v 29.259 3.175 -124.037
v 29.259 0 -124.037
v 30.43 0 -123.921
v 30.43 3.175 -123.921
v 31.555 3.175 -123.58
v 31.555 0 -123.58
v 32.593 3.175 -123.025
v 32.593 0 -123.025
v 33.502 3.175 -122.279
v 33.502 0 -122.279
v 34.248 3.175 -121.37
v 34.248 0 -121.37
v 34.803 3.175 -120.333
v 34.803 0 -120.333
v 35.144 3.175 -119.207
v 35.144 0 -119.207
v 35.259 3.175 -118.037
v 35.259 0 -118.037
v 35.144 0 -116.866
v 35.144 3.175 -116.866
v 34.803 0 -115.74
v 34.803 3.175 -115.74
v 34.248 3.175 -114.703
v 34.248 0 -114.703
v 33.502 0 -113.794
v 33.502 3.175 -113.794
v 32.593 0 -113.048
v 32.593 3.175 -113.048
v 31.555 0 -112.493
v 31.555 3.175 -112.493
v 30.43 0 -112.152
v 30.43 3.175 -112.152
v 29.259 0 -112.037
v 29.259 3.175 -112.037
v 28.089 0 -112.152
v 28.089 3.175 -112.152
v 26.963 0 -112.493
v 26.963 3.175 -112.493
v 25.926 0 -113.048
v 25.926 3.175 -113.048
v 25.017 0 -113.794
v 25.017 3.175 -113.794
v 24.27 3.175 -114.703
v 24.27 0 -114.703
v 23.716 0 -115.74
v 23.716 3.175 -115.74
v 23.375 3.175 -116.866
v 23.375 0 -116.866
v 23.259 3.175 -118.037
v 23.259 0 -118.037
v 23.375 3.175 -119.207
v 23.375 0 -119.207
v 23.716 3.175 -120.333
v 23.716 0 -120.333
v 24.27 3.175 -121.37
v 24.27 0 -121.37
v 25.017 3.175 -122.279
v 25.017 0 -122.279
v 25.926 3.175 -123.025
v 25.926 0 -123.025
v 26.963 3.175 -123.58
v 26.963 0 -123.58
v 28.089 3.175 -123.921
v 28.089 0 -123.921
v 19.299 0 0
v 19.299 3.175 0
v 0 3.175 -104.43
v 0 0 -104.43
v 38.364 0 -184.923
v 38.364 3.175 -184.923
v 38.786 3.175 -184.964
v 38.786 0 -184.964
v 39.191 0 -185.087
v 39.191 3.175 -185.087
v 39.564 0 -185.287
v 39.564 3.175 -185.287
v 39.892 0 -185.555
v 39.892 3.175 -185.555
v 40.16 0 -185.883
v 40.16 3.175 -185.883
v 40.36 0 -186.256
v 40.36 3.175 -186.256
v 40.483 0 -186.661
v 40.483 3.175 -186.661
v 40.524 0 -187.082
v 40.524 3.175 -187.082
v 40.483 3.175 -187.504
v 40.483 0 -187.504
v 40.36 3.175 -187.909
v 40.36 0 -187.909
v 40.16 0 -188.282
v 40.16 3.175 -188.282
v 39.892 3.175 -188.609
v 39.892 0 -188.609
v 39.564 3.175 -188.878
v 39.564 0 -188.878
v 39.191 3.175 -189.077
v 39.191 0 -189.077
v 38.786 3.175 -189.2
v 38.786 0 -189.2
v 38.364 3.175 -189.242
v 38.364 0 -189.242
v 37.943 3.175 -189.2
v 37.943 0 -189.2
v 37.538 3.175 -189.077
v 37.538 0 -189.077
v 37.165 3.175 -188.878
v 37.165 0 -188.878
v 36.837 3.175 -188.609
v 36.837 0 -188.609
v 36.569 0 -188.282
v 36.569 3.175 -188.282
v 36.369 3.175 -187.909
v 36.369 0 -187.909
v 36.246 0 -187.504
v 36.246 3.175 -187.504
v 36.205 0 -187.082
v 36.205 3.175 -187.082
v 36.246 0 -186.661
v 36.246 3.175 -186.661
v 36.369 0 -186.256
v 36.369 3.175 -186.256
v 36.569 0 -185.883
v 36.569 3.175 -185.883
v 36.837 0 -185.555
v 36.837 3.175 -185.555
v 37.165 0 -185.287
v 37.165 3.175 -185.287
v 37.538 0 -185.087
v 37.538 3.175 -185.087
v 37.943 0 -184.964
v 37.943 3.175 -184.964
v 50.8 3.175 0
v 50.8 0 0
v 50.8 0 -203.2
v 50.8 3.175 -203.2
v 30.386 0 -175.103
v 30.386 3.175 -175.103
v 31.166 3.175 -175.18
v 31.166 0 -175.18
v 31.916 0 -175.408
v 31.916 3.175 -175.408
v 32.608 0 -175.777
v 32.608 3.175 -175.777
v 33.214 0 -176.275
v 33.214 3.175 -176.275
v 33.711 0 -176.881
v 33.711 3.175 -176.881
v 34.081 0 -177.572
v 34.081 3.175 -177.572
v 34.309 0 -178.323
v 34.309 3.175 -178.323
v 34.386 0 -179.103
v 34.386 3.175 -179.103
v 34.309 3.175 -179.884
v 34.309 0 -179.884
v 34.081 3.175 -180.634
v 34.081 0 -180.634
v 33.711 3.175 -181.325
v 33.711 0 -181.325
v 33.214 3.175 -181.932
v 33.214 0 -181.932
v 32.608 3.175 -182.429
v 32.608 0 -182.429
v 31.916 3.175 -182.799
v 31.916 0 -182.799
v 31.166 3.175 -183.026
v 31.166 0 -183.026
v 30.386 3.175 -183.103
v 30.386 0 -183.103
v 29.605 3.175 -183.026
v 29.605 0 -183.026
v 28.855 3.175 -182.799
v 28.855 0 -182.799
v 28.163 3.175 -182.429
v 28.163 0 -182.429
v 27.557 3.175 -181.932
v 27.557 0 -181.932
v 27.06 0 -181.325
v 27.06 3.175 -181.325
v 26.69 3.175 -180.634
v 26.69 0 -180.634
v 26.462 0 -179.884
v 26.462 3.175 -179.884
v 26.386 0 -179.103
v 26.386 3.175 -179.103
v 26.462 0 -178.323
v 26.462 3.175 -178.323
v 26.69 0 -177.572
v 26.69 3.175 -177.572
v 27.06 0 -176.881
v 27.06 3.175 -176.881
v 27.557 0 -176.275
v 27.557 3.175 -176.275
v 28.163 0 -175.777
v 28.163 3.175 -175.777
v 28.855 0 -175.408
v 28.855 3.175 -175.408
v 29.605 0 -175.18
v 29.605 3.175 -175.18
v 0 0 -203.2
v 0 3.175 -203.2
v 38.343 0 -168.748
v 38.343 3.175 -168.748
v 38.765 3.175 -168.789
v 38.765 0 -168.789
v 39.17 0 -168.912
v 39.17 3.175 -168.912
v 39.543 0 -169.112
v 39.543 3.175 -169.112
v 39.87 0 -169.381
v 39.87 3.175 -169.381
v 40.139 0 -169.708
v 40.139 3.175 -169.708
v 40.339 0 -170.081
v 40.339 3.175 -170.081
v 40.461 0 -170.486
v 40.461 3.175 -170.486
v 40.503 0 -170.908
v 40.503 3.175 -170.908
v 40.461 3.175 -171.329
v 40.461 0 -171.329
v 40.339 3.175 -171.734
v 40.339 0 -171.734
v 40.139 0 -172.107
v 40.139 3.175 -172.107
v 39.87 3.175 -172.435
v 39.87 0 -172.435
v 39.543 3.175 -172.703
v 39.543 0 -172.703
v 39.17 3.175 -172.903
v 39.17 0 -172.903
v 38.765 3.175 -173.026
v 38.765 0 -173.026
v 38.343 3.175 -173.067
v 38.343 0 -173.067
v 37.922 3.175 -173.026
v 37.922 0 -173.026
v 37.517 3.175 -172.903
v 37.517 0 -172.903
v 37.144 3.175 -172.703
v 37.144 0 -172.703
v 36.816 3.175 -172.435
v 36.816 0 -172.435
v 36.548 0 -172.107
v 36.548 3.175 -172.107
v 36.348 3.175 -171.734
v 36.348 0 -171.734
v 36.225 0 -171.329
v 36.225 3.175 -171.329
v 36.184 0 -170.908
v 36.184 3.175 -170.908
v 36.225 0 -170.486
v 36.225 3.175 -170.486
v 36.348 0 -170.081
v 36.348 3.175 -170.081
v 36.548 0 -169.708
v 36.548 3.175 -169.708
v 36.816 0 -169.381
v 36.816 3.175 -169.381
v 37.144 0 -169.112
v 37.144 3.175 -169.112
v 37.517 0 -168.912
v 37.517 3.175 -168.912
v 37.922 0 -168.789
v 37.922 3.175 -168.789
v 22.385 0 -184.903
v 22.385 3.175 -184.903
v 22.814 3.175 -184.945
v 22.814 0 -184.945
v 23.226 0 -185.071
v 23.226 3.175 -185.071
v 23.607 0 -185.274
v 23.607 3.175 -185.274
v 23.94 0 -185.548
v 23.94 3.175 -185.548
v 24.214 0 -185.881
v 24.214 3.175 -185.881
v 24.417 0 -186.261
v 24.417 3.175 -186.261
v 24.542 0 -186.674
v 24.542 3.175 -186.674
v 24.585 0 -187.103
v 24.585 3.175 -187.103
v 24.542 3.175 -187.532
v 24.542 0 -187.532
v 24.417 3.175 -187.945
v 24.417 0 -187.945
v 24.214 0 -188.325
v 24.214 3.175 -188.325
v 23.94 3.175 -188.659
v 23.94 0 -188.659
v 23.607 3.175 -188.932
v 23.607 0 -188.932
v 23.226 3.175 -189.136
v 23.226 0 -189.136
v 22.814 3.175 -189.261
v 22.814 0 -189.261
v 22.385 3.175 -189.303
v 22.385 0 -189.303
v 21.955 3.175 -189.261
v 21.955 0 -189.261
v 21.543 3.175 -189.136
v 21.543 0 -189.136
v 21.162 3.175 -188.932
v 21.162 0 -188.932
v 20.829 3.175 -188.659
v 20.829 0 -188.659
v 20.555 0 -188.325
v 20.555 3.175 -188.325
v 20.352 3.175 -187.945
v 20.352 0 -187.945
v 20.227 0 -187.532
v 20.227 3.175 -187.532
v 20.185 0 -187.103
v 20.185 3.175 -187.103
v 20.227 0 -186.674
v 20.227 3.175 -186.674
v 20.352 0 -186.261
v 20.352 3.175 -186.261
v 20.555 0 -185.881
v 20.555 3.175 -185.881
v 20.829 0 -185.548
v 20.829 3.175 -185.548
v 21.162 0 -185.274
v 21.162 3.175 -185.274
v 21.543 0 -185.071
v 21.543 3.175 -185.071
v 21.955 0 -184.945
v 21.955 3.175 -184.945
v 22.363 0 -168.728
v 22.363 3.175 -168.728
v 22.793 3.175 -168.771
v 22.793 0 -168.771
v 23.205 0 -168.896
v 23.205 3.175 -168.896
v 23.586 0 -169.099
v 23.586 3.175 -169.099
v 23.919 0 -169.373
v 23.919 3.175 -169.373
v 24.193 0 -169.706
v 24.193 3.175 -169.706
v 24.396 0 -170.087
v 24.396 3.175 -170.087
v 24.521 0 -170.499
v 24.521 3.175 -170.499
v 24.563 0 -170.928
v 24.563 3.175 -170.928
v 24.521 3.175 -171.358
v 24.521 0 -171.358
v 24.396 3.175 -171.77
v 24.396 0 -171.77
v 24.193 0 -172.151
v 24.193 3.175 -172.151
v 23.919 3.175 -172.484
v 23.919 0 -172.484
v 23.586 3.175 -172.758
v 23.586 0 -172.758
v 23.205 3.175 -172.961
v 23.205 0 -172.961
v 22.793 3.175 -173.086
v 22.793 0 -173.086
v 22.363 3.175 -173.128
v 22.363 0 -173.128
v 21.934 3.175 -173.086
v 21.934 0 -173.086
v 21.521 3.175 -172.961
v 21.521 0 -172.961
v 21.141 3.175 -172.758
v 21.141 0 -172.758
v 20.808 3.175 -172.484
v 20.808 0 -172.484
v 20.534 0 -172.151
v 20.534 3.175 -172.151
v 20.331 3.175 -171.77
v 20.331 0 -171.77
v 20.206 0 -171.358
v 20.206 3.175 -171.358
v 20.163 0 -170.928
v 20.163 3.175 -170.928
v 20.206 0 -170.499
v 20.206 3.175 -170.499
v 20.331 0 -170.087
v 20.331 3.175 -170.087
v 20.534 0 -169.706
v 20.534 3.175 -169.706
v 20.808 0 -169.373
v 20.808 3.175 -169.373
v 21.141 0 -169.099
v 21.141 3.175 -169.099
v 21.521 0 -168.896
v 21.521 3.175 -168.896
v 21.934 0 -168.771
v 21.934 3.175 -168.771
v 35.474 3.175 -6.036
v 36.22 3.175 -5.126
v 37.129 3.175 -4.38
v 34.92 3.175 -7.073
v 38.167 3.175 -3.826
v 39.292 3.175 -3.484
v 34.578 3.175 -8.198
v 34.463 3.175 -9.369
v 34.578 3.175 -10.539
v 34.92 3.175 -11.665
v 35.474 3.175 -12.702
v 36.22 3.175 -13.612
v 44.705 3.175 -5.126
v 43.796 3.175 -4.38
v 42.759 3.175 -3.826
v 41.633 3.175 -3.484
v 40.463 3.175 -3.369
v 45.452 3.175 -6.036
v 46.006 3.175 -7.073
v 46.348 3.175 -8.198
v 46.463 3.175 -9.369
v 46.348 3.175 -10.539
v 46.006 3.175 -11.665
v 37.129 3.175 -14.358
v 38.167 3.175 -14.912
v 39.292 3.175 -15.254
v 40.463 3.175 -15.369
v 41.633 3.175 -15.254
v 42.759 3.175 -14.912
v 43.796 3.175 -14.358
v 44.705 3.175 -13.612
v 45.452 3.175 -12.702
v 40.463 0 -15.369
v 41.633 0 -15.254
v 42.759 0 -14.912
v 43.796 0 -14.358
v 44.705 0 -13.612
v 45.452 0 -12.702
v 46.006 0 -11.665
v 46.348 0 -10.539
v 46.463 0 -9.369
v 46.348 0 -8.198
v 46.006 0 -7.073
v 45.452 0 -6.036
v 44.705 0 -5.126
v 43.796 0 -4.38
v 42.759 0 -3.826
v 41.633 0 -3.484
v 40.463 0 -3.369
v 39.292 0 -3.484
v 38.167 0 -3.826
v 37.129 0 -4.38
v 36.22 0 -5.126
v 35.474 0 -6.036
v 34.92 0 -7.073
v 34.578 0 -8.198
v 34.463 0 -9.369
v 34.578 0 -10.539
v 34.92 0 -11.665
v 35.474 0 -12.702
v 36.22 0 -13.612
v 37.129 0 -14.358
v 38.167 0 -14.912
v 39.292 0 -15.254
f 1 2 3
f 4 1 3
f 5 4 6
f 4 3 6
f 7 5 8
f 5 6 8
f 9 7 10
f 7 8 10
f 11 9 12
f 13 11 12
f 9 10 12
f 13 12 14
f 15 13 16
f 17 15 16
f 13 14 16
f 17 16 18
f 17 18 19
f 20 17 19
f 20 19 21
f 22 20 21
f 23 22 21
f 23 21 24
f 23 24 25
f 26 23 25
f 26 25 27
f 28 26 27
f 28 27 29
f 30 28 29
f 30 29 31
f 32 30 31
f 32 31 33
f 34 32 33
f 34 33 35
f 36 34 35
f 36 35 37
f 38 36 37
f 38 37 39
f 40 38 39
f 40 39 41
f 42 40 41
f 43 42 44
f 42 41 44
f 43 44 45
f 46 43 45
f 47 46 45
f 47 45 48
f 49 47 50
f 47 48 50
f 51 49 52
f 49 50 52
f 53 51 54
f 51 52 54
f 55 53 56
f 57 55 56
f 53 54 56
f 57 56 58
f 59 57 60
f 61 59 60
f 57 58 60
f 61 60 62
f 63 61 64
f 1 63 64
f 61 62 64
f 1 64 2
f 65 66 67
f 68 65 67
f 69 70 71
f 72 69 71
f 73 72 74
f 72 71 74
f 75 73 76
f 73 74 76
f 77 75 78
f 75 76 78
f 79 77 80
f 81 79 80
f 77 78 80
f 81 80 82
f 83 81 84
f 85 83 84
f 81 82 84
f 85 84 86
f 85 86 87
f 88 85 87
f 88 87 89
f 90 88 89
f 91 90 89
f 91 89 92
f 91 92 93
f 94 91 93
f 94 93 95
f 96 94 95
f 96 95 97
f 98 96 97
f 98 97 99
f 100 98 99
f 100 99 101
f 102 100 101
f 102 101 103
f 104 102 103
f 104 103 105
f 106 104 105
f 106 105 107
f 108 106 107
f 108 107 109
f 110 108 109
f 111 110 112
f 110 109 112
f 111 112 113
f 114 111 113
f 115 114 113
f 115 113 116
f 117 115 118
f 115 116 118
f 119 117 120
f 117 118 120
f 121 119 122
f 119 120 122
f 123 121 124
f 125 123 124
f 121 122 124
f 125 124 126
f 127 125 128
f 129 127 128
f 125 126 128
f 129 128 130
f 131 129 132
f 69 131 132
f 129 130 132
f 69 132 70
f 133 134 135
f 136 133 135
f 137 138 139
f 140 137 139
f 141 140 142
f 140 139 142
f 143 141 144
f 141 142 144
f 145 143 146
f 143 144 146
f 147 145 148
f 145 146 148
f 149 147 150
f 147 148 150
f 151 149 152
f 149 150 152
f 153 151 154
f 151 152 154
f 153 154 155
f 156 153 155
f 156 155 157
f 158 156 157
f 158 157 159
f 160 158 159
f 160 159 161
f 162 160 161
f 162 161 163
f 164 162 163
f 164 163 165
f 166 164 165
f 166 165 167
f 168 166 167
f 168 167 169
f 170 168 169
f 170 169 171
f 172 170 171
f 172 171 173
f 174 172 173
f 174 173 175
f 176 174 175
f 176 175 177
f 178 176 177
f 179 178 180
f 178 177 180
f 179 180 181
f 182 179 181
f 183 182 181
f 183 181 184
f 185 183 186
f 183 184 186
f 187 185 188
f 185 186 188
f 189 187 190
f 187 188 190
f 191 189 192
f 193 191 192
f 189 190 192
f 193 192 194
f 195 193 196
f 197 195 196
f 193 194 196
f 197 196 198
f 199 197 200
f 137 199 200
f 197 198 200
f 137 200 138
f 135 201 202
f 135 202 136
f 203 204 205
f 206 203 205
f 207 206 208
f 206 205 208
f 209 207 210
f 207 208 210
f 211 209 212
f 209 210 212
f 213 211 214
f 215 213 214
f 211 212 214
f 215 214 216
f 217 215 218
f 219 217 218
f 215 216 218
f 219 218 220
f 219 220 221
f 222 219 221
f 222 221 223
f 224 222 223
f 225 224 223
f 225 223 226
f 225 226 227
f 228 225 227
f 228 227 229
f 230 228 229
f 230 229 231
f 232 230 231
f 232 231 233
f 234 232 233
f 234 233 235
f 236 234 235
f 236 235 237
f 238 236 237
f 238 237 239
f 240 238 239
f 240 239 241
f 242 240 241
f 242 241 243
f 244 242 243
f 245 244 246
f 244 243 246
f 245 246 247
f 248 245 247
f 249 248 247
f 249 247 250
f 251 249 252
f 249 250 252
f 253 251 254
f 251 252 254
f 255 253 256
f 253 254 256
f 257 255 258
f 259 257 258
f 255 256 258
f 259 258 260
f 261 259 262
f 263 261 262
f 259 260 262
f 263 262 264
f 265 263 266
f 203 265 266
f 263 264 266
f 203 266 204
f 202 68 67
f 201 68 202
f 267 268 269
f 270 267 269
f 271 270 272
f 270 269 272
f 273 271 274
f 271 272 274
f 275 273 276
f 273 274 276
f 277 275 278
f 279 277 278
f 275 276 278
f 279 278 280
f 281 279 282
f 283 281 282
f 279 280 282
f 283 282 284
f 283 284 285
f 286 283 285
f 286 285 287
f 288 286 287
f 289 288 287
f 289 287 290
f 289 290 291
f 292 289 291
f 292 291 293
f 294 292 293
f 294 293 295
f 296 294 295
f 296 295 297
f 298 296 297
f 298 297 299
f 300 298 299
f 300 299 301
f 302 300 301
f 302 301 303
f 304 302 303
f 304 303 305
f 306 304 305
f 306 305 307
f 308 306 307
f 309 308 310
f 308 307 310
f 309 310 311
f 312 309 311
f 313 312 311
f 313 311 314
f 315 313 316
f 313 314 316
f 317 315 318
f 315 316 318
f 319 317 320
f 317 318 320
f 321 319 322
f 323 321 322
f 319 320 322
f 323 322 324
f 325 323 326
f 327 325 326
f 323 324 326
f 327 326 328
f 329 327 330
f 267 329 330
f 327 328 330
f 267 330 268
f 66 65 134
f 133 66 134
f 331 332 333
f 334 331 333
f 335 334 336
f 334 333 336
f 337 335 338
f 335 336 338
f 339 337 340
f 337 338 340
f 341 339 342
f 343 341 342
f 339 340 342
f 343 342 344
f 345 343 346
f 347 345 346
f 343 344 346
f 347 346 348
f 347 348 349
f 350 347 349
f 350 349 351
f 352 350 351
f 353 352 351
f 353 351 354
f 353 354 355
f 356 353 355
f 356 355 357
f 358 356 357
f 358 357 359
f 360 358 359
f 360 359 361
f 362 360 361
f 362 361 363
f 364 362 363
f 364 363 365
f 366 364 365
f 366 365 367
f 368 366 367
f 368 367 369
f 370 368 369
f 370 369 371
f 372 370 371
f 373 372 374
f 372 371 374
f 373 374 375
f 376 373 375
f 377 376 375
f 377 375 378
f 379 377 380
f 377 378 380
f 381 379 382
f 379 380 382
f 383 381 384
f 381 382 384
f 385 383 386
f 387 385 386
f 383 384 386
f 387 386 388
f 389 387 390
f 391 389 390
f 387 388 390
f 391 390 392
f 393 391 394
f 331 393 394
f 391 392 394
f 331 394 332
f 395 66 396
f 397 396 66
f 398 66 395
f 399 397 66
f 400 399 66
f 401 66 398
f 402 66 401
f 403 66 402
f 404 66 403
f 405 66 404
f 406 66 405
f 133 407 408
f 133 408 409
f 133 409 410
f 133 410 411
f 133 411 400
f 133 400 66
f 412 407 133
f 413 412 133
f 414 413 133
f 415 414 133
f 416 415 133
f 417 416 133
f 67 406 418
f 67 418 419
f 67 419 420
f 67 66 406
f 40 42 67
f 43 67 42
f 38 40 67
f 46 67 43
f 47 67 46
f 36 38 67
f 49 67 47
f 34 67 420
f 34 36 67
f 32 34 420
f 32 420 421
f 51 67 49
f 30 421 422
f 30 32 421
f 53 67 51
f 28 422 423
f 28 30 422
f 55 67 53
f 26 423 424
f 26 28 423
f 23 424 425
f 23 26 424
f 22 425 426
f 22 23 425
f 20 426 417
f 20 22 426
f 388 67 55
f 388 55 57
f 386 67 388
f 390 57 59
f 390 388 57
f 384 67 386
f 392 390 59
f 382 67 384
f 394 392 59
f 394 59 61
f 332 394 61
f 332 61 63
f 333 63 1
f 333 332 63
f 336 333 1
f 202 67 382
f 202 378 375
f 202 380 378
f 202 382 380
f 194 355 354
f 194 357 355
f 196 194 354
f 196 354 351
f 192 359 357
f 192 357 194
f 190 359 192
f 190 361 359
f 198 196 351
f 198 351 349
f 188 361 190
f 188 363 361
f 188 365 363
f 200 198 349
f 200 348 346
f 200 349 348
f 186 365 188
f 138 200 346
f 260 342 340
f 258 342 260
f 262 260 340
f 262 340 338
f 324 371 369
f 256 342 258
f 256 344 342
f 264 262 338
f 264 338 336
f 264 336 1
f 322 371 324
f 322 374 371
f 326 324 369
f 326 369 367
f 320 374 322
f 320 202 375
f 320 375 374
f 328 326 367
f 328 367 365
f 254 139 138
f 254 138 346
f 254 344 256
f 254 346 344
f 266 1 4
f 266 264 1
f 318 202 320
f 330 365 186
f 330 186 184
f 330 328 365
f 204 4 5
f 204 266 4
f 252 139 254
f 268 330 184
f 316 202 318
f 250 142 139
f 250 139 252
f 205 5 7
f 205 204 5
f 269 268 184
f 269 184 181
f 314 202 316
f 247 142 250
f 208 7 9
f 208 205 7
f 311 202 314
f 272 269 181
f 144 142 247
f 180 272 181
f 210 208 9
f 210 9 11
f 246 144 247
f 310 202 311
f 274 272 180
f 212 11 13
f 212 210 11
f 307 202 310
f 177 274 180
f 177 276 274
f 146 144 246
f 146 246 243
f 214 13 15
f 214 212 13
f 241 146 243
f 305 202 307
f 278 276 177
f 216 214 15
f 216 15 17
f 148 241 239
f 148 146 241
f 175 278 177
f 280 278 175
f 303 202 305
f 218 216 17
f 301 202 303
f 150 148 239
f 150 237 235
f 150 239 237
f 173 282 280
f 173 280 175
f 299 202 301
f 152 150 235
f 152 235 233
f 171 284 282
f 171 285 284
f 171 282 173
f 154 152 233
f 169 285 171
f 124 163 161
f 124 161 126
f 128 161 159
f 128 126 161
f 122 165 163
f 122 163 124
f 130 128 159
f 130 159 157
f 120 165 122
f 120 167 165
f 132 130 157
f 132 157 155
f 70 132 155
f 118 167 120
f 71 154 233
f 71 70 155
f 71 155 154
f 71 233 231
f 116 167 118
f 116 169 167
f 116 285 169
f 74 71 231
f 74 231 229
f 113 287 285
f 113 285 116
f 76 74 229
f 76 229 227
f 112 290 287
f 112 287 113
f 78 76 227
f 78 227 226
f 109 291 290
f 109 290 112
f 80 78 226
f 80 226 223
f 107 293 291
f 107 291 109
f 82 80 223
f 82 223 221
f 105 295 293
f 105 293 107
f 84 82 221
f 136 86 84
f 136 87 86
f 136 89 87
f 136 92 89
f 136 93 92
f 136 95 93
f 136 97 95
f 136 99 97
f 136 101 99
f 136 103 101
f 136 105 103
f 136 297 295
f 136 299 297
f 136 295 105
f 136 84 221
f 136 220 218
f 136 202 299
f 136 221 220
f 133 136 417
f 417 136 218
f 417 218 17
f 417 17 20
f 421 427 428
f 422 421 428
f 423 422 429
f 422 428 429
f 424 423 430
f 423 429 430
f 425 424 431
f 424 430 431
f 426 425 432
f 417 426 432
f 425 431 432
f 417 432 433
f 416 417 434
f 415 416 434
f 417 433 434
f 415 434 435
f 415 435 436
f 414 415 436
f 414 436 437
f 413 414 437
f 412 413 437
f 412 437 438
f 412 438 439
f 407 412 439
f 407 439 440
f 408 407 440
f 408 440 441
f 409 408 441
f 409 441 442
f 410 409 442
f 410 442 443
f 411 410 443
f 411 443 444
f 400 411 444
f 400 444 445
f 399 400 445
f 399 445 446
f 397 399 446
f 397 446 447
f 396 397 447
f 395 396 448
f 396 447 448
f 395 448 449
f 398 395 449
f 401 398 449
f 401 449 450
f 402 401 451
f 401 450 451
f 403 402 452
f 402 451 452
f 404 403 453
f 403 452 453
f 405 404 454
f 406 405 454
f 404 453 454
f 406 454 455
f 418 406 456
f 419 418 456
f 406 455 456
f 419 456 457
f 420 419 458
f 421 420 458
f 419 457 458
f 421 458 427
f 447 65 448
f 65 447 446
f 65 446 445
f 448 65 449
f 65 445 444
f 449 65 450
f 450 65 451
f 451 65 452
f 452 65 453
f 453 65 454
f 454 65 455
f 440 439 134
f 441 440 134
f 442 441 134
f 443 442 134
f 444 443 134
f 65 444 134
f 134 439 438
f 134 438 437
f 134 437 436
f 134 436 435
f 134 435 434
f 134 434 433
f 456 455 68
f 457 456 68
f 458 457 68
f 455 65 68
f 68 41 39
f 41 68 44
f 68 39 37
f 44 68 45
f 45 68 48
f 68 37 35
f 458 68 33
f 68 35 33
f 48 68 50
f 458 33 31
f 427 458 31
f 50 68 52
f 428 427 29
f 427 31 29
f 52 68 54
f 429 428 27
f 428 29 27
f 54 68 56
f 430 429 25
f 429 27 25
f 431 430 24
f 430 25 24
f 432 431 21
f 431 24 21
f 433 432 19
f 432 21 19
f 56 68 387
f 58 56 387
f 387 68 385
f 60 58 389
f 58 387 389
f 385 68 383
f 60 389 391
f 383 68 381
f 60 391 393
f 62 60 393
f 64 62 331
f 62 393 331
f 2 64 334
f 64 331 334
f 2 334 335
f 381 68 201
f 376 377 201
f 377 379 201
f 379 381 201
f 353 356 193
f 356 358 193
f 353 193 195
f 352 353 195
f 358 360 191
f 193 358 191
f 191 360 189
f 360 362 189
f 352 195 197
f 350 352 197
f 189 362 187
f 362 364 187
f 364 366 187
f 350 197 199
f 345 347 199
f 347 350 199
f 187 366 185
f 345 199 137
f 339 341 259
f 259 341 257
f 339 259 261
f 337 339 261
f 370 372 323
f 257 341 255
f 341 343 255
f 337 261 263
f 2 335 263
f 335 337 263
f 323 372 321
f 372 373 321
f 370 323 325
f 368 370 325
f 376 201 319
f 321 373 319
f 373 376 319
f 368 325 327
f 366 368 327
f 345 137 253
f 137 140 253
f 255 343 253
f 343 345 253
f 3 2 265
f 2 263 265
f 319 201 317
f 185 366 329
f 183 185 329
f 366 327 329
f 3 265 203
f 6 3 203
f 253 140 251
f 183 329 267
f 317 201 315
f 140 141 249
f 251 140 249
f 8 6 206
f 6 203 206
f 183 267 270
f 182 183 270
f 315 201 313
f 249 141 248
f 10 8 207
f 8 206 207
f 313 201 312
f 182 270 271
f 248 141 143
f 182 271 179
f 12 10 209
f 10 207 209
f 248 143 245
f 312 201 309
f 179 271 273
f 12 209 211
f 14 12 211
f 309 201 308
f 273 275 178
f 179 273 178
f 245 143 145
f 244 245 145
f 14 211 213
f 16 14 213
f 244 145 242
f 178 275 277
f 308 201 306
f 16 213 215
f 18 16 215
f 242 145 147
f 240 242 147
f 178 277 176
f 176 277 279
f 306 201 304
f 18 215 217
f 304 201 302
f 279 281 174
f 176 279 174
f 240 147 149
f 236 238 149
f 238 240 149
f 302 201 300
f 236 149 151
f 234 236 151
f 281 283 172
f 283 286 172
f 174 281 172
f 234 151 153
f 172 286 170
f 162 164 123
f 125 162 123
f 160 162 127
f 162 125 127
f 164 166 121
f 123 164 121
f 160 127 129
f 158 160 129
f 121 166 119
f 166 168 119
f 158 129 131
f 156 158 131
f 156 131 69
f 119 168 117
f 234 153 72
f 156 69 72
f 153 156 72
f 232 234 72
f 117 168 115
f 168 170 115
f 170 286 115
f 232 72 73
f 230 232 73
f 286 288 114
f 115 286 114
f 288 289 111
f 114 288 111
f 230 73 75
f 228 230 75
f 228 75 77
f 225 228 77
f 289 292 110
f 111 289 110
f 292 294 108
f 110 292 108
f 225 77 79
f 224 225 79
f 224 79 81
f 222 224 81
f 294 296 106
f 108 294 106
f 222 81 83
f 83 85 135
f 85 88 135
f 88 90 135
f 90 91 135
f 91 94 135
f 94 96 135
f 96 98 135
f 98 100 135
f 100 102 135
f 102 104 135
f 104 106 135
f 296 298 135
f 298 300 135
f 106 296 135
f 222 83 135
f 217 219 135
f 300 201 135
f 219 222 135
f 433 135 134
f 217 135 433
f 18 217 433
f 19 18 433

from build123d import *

# Parameters (mm, degrees)
SKETCH1_W           = 50.8
SKETCH1_H           = 203.2
BOSS_EXTRUDE1_DEPTH = 3.175
SKETCH2_R           = 2.2
SKETCH2_R_2         = 2.159579804
SKETCH2_R_3         = 4
CUT_EXTRUDE1_DEPTH  = 10
SKETCH5_R           = 6
CUT_EXTRUDE2_DEPTH  = 10
CUT_EXTRUDE3_DEPTH  = 10


with BuildPart() as part:
    # Sketch1 → Boss-Extrude1 (new body)
    with BuildSketch(Plane(origin=(0, 0, 0), x_dir=(1, 0, 0), z_dir=(0, 1, 0))):
        with Locations((25.4, 101.6)):
            Rectangle(SKETCH1_W, SKETCH1_H)
    extrude(amount=BOSS_EXTRUDE1_DEPTH)

    # Sketch2 → Cut-Extrude1 (cut)
    with BuildSketch(Plane(origin=(0, 3.175, 0), x_dir=(1, 0, 0), z_dir=(0, 1, 0))):
        with Locations(Location((22.384513462, 187.103195302, 0), (0, 0, 270))):
            Circle(SKETCH2_R)
        with Locations(Location((38.36448905, 187.082300612, 0), (0, 0, 270))):
            Circle(SKETCH2_R_2)
        with Locations(Location((22.363364113, 170.92846049, 0), (0, 0, 270))):
            Circle(SKETCH2_R)
        with Locations(Location((38.343339701, 170.907565799, 0), (0, 0, 270))):
            Circle(SKETCH2_R_2)
        with Locations(Location((30.385513462, 179.103195302, 0), (0, 0, 270))):
            Circle(SKETCH2_R_3)
    extrude(amount=-CUT_EXTRUDE1_DEPTH, mode=Mode.SUBTRACT)

    # Sketch5 → Cut-Extrude2 (cut)
    with BuildSketch(Plane(origin=(0, 0, 0), x_dir=(-1, 0, 0), z_dir=(0, -1, 0))):
        with Locations(Location((-40.462848215, 9.36892711, 0), (0, 0, 90))):
            Circle(SKETCH5_R)
        with Locations(Location((-29.259232092, 118.036539738, 0), (0, 0, 90))):
            Circle(SKETCH5_R)
    extrude(amount=-CUT_EXTRUDE2_DEPTH, mode=Mode.SUBTRACT)

    # Sketch6 → Cut-Extrude3 (cut)
    with BuildSketch(Plane(origin=(0, 3.175, 0), x_dir=(1, 0, 0), z_dir=(0, 1, 0))):
        Polygon((0, 0), (19.29895822, 0), (-0.185019924, 105.431539045), align=None)
    extrude(amount=-CUT_EXTRUDE3_DEPTH, mode=Mode.SUBTRACT)


solid = part.part
